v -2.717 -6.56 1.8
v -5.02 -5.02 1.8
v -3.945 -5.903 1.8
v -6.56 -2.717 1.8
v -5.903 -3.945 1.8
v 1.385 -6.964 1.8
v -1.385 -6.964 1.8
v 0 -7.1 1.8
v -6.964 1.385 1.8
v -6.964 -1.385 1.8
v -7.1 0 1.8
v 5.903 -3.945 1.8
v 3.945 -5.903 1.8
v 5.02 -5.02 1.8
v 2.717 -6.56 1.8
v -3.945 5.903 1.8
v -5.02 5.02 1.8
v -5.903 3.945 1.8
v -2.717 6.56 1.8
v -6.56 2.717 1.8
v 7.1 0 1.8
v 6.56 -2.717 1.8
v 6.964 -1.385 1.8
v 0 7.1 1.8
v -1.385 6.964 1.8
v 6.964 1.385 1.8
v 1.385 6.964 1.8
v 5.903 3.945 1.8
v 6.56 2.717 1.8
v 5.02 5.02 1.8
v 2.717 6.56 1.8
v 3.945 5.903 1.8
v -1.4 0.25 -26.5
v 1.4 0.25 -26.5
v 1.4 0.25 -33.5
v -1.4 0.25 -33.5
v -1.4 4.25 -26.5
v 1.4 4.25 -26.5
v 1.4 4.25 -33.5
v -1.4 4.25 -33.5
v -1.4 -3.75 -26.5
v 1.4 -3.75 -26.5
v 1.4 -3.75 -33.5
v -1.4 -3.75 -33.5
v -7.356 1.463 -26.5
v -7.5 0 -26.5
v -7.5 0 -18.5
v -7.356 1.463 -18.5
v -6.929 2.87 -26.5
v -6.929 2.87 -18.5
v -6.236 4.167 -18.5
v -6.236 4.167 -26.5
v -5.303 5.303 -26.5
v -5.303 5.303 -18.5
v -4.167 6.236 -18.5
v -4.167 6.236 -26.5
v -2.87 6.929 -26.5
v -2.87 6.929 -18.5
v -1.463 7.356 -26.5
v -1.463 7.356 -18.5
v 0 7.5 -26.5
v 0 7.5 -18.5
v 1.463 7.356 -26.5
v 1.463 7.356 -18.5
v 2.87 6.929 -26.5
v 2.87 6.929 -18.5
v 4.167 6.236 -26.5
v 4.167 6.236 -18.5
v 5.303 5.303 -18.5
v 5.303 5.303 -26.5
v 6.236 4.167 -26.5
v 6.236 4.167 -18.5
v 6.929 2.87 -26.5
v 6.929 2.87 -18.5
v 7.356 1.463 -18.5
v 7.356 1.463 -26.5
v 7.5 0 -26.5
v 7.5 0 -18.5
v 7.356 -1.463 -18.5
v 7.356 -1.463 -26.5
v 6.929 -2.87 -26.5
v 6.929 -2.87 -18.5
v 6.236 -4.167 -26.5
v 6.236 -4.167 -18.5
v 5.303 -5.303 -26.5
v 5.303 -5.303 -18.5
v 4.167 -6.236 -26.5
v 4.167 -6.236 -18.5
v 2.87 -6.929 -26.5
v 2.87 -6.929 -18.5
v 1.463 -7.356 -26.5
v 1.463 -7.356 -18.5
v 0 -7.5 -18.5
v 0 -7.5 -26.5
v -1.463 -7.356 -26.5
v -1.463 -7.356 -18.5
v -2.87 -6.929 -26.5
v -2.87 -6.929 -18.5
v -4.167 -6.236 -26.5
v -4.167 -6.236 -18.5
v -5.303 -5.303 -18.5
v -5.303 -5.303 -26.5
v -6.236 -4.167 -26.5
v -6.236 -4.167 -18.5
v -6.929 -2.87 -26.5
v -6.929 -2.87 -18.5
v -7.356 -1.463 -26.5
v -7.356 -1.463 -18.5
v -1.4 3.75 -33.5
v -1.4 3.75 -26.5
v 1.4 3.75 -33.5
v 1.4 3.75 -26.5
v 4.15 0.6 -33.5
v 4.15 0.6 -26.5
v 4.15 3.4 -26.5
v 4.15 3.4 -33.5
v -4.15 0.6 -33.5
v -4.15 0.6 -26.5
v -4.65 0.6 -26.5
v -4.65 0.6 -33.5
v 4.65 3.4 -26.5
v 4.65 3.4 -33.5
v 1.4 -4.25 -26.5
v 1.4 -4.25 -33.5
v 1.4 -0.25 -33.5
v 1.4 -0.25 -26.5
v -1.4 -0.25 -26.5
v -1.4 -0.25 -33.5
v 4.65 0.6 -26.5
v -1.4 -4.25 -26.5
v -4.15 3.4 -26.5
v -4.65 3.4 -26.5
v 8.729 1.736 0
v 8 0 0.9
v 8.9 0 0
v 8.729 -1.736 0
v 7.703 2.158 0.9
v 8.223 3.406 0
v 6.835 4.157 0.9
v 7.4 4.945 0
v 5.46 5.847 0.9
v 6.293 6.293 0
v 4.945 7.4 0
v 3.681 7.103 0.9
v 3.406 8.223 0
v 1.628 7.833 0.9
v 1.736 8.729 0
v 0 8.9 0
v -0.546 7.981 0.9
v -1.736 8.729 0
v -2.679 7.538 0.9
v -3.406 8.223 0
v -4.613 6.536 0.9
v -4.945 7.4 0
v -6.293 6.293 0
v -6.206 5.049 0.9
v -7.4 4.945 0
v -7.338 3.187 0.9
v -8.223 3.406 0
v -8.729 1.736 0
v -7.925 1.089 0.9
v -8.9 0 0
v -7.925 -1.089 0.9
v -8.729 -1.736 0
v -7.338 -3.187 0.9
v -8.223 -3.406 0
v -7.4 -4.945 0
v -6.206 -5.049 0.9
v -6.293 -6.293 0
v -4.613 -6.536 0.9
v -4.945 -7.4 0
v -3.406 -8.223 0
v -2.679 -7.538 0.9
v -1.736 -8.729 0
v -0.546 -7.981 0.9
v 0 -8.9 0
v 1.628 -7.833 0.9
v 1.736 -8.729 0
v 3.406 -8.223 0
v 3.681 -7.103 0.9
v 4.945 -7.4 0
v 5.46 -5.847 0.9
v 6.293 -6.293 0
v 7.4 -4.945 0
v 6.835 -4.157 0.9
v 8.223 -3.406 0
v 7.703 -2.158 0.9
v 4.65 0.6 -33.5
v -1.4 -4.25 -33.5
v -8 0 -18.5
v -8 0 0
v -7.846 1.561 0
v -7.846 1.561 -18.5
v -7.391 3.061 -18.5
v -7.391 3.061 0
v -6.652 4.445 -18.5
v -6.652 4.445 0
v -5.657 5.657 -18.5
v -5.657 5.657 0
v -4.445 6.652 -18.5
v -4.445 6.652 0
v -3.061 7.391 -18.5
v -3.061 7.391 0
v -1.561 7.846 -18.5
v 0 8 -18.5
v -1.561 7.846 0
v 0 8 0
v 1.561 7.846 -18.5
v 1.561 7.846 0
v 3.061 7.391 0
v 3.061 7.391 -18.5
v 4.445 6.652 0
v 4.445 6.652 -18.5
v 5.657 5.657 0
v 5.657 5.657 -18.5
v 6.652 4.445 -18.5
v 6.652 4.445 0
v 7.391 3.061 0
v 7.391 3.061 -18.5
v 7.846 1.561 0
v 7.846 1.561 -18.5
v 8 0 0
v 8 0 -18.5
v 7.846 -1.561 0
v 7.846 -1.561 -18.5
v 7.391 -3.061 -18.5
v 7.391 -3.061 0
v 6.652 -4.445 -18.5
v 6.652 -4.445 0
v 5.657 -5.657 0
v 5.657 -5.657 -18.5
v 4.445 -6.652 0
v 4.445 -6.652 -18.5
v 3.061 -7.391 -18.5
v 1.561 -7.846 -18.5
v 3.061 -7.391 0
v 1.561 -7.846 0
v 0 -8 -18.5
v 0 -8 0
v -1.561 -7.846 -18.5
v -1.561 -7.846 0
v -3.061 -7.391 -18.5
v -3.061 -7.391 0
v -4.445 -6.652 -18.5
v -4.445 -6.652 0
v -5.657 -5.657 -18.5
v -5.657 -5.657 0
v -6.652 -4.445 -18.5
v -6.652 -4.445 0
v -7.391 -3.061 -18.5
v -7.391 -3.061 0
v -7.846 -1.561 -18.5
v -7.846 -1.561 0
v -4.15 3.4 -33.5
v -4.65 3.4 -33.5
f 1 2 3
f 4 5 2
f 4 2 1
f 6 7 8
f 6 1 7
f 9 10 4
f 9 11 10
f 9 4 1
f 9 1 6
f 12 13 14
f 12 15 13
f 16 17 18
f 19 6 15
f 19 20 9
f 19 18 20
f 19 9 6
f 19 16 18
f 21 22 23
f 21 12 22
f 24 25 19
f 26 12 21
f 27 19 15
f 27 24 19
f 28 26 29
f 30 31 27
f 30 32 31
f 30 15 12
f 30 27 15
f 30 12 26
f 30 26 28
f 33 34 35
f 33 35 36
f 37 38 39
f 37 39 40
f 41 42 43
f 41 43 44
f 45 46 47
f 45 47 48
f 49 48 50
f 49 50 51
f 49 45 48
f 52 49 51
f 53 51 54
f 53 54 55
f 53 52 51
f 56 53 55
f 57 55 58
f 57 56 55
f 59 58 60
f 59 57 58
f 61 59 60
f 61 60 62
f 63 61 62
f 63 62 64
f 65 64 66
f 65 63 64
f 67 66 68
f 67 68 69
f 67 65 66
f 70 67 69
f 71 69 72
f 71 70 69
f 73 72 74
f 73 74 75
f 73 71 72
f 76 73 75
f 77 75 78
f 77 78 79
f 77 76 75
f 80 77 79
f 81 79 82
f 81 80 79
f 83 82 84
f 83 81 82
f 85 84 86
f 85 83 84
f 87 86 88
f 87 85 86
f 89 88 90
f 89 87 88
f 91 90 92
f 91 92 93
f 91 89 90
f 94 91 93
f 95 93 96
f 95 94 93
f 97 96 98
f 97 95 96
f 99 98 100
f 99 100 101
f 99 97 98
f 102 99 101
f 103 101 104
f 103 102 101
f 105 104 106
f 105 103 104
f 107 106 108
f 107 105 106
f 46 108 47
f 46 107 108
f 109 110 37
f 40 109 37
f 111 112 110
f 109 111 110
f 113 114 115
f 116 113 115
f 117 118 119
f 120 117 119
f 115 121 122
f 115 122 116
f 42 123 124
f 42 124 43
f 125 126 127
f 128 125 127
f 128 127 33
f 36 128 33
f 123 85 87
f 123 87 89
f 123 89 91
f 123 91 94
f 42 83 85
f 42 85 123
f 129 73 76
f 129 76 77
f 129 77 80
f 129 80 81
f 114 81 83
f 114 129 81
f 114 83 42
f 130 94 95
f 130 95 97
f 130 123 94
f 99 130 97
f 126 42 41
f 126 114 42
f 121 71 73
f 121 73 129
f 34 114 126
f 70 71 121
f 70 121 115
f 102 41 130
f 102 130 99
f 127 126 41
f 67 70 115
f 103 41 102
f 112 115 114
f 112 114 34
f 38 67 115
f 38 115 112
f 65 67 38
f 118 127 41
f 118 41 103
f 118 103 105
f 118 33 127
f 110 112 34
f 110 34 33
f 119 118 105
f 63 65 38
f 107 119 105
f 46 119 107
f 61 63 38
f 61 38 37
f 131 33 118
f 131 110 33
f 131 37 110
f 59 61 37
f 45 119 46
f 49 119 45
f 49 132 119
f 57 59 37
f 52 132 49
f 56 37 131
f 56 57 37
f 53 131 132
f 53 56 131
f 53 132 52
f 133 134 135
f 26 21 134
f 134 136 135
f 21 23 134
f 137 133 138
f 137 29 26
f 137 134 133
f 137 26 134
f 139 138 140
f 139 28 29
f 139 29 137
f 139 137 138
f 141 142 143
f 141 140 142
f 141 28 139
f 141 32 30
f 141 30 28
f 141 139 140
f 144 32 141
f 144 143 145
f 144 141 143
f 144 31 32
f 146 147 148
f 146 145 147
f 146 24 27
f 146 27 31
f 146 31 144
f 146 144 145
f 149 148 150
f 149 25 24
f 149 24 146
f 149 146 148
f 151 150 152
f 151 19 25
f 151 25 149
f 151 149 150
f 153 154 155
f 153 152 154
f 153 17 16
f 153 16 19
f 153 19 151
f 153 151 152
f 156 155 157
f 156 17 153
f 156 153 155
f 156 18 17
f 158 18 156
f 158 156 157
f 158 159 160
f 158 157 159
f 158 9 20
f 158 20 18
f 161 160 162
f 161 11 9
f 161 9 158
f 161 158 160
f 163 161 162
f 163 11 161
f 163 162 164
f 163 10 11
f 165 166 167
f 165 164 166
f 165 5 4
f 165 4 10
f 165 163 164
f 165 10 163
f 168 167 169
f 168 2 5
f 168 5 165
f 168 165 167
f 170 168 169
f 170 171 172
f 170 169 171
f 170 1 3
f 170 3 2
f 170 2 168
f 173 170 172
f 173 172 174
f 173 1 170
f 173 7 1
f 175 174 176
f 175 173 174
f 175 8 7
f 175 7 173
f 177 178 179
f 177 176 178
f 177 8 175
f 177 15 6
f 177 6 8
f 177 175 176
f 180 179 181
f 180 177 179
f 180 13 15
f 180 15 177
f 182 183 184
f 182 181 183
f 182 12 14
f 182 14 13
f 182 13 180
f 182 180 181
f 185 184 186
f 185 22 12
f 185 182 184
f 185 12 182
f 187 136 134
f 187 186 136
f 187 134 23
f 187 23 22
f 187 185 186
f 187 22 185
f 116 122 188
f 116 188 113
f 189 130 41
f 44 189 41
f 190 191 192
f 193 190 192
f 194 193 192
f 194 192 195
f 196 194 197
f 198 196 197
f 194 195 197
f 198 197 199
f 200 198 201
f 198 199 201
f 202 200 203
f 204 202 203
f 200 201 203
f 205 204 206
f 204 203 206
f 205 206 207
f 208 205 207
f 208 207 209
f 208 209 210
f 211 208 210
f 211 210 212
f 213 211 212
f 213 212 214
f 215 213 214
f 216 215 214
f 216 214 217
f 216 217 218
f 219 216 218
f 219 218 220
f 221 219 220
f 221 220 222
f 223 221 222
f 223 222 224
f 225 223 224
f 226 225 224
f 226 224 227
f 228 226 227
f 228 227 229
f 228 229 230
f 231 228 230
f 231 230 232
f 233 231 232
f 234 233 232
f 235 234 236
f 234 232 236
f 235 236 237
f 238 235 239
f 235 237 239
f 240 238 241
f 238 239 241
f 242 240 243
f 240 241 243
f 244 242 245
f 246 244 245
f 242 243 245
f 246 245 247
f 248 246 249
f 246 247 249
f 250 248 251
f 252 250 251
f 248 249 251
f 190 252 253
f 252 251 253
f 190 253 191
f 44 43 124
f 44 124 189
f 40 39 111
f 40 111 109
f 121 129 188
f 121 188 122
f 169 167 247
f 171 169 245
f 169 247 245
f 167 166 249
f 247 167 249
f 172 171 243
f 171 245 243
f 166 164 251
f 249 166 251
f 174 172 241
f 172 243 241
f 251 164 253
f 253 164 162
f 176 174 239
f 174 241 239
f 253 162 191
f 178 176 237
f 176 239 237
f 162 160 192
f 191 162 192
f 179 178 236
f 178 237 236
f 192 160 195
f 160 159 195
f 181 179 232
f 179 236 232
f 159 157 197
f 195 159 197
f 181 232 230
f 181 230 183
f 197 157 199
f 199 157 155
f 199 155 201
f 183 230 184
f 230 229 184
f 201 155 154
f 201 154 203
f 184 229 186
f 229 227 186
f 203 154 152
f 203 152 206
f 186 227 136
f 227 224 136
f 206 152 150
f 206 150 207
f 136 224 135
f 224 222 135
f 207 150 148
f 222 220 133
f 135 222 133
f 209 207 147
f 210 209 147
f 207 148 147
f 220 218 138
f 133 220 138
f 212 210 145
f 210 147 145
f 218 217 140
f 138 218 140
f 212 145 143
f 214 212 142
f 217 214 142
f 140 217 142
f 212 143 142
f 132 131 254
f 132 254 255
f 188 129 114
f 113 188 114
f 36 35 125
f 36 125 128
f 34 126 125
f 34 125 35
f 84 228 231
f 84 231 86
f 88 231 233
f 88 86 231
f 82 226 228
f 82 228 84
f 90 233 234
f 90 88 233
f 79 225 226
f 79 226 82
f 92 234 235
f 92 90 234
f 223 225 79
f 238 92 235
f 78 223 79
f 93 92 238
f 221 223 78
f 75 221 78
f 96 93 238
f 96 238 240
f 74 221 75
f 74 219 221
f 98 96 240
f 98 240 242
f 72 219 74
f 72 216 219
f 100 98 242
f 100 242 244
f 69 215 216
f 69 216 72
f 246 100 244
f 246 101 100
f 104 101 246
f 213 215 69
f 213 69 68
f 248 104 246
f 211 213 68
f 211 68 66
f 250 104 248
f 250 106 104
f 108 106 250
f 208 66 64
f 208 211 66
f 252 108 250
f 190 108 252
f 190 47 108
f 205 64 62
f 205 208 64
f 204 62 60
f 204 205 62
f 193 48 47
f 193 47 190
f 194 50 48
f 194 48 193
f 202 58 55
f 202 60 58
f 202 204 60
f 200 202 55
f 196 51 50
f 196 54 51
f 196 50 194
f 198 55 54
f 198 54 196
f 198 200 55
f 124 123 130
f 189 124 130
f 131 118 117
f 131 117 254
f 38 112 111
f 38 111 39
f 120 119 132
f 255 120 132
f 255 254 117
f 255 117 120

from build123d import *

# Parameters (mm, degrees)
SKETCH_1_R          = 8.9
EXTRUDE_1_DEPTH     = 1.8
EXTRUDE_1_TAPER     = 45
SKETCH_2_R          = 8
EXTRUDE_2_DEPTH     = 26.5
SKETCH_3_W          = 2.8
SKETCH_3_H          = 0.5
SKETCH_3_W_2        = 0.5
SKETCH_3_H_2        = 2.8
EXTRUDE_1_2_DEPTH   = 7
SKETCH_4_R          = 8
SKETCH_4_R_2        = 7.5
CUT_EXTRUDE_1_DEPTH = 8


with BuildPart() as part:
    # 草图1 → Extrude 1 (new body)
    with BuildSketch(Plane.XY):
        Circle(SKETCH_1_R)
    extrude(amount=EXTRUDE_1_DEPTH, taper=EXTRUDE_1_TAPER)

    # 草图2 → 凸台-拉伸2 (add)
    with BuildSketch(Plane(origin=(0, 0, 0), x_dir=(-1, 0, 0), z_dir=(0, 0, -1))):
        Circle(SKETCH_2_R)
    extrude(amount=EXTRUDE_2_DEPTH)

    # 草图3 → Extrude 1 2 (add)
    with BuildSketch(Plane(origin=(0, 0, -26.5), x_dir=(-1, 0, 0), z_dir=(0, 0, -1))):
        Rectangle(SKETCH_3_W, SKETCH_3_H)
        with Locations((0, 4)):
            Rectangle(SKETCH_3_W, SKETCH_3_H)
        with Locations((0, -4)):
            Rectangle(SKETCH_3_W, SKETCH_3_H)
        with Locations((-4.4, 2)):
            Rectangle(SKETCH_3_W_2, SKETCH_3_H_2)
        with Locations((4.4, 2)):
            Rectangle(SKETCH_3_W_2, SKETCH_3_H_2)
    extrude(amount=EXTRUDE_1_2_DEPTH)

    # 草图4 → 切除-拉伸-薄壁1 (cut)
    with BuildSketch(Plane(origin=(0, 0, -26.5), x_dir=(-1, 0, 0), z_dir=(0, 0, -1))):
        Circle(SKETCH_4_R)
        Circle(SKETCH_4_R_2, mode=Mode.SUBTRACT)
    extrude(amount=-CUT_EXTRUDE_1_DEPTH, mode=Mode.SUBTRACT)


solid = part.part
